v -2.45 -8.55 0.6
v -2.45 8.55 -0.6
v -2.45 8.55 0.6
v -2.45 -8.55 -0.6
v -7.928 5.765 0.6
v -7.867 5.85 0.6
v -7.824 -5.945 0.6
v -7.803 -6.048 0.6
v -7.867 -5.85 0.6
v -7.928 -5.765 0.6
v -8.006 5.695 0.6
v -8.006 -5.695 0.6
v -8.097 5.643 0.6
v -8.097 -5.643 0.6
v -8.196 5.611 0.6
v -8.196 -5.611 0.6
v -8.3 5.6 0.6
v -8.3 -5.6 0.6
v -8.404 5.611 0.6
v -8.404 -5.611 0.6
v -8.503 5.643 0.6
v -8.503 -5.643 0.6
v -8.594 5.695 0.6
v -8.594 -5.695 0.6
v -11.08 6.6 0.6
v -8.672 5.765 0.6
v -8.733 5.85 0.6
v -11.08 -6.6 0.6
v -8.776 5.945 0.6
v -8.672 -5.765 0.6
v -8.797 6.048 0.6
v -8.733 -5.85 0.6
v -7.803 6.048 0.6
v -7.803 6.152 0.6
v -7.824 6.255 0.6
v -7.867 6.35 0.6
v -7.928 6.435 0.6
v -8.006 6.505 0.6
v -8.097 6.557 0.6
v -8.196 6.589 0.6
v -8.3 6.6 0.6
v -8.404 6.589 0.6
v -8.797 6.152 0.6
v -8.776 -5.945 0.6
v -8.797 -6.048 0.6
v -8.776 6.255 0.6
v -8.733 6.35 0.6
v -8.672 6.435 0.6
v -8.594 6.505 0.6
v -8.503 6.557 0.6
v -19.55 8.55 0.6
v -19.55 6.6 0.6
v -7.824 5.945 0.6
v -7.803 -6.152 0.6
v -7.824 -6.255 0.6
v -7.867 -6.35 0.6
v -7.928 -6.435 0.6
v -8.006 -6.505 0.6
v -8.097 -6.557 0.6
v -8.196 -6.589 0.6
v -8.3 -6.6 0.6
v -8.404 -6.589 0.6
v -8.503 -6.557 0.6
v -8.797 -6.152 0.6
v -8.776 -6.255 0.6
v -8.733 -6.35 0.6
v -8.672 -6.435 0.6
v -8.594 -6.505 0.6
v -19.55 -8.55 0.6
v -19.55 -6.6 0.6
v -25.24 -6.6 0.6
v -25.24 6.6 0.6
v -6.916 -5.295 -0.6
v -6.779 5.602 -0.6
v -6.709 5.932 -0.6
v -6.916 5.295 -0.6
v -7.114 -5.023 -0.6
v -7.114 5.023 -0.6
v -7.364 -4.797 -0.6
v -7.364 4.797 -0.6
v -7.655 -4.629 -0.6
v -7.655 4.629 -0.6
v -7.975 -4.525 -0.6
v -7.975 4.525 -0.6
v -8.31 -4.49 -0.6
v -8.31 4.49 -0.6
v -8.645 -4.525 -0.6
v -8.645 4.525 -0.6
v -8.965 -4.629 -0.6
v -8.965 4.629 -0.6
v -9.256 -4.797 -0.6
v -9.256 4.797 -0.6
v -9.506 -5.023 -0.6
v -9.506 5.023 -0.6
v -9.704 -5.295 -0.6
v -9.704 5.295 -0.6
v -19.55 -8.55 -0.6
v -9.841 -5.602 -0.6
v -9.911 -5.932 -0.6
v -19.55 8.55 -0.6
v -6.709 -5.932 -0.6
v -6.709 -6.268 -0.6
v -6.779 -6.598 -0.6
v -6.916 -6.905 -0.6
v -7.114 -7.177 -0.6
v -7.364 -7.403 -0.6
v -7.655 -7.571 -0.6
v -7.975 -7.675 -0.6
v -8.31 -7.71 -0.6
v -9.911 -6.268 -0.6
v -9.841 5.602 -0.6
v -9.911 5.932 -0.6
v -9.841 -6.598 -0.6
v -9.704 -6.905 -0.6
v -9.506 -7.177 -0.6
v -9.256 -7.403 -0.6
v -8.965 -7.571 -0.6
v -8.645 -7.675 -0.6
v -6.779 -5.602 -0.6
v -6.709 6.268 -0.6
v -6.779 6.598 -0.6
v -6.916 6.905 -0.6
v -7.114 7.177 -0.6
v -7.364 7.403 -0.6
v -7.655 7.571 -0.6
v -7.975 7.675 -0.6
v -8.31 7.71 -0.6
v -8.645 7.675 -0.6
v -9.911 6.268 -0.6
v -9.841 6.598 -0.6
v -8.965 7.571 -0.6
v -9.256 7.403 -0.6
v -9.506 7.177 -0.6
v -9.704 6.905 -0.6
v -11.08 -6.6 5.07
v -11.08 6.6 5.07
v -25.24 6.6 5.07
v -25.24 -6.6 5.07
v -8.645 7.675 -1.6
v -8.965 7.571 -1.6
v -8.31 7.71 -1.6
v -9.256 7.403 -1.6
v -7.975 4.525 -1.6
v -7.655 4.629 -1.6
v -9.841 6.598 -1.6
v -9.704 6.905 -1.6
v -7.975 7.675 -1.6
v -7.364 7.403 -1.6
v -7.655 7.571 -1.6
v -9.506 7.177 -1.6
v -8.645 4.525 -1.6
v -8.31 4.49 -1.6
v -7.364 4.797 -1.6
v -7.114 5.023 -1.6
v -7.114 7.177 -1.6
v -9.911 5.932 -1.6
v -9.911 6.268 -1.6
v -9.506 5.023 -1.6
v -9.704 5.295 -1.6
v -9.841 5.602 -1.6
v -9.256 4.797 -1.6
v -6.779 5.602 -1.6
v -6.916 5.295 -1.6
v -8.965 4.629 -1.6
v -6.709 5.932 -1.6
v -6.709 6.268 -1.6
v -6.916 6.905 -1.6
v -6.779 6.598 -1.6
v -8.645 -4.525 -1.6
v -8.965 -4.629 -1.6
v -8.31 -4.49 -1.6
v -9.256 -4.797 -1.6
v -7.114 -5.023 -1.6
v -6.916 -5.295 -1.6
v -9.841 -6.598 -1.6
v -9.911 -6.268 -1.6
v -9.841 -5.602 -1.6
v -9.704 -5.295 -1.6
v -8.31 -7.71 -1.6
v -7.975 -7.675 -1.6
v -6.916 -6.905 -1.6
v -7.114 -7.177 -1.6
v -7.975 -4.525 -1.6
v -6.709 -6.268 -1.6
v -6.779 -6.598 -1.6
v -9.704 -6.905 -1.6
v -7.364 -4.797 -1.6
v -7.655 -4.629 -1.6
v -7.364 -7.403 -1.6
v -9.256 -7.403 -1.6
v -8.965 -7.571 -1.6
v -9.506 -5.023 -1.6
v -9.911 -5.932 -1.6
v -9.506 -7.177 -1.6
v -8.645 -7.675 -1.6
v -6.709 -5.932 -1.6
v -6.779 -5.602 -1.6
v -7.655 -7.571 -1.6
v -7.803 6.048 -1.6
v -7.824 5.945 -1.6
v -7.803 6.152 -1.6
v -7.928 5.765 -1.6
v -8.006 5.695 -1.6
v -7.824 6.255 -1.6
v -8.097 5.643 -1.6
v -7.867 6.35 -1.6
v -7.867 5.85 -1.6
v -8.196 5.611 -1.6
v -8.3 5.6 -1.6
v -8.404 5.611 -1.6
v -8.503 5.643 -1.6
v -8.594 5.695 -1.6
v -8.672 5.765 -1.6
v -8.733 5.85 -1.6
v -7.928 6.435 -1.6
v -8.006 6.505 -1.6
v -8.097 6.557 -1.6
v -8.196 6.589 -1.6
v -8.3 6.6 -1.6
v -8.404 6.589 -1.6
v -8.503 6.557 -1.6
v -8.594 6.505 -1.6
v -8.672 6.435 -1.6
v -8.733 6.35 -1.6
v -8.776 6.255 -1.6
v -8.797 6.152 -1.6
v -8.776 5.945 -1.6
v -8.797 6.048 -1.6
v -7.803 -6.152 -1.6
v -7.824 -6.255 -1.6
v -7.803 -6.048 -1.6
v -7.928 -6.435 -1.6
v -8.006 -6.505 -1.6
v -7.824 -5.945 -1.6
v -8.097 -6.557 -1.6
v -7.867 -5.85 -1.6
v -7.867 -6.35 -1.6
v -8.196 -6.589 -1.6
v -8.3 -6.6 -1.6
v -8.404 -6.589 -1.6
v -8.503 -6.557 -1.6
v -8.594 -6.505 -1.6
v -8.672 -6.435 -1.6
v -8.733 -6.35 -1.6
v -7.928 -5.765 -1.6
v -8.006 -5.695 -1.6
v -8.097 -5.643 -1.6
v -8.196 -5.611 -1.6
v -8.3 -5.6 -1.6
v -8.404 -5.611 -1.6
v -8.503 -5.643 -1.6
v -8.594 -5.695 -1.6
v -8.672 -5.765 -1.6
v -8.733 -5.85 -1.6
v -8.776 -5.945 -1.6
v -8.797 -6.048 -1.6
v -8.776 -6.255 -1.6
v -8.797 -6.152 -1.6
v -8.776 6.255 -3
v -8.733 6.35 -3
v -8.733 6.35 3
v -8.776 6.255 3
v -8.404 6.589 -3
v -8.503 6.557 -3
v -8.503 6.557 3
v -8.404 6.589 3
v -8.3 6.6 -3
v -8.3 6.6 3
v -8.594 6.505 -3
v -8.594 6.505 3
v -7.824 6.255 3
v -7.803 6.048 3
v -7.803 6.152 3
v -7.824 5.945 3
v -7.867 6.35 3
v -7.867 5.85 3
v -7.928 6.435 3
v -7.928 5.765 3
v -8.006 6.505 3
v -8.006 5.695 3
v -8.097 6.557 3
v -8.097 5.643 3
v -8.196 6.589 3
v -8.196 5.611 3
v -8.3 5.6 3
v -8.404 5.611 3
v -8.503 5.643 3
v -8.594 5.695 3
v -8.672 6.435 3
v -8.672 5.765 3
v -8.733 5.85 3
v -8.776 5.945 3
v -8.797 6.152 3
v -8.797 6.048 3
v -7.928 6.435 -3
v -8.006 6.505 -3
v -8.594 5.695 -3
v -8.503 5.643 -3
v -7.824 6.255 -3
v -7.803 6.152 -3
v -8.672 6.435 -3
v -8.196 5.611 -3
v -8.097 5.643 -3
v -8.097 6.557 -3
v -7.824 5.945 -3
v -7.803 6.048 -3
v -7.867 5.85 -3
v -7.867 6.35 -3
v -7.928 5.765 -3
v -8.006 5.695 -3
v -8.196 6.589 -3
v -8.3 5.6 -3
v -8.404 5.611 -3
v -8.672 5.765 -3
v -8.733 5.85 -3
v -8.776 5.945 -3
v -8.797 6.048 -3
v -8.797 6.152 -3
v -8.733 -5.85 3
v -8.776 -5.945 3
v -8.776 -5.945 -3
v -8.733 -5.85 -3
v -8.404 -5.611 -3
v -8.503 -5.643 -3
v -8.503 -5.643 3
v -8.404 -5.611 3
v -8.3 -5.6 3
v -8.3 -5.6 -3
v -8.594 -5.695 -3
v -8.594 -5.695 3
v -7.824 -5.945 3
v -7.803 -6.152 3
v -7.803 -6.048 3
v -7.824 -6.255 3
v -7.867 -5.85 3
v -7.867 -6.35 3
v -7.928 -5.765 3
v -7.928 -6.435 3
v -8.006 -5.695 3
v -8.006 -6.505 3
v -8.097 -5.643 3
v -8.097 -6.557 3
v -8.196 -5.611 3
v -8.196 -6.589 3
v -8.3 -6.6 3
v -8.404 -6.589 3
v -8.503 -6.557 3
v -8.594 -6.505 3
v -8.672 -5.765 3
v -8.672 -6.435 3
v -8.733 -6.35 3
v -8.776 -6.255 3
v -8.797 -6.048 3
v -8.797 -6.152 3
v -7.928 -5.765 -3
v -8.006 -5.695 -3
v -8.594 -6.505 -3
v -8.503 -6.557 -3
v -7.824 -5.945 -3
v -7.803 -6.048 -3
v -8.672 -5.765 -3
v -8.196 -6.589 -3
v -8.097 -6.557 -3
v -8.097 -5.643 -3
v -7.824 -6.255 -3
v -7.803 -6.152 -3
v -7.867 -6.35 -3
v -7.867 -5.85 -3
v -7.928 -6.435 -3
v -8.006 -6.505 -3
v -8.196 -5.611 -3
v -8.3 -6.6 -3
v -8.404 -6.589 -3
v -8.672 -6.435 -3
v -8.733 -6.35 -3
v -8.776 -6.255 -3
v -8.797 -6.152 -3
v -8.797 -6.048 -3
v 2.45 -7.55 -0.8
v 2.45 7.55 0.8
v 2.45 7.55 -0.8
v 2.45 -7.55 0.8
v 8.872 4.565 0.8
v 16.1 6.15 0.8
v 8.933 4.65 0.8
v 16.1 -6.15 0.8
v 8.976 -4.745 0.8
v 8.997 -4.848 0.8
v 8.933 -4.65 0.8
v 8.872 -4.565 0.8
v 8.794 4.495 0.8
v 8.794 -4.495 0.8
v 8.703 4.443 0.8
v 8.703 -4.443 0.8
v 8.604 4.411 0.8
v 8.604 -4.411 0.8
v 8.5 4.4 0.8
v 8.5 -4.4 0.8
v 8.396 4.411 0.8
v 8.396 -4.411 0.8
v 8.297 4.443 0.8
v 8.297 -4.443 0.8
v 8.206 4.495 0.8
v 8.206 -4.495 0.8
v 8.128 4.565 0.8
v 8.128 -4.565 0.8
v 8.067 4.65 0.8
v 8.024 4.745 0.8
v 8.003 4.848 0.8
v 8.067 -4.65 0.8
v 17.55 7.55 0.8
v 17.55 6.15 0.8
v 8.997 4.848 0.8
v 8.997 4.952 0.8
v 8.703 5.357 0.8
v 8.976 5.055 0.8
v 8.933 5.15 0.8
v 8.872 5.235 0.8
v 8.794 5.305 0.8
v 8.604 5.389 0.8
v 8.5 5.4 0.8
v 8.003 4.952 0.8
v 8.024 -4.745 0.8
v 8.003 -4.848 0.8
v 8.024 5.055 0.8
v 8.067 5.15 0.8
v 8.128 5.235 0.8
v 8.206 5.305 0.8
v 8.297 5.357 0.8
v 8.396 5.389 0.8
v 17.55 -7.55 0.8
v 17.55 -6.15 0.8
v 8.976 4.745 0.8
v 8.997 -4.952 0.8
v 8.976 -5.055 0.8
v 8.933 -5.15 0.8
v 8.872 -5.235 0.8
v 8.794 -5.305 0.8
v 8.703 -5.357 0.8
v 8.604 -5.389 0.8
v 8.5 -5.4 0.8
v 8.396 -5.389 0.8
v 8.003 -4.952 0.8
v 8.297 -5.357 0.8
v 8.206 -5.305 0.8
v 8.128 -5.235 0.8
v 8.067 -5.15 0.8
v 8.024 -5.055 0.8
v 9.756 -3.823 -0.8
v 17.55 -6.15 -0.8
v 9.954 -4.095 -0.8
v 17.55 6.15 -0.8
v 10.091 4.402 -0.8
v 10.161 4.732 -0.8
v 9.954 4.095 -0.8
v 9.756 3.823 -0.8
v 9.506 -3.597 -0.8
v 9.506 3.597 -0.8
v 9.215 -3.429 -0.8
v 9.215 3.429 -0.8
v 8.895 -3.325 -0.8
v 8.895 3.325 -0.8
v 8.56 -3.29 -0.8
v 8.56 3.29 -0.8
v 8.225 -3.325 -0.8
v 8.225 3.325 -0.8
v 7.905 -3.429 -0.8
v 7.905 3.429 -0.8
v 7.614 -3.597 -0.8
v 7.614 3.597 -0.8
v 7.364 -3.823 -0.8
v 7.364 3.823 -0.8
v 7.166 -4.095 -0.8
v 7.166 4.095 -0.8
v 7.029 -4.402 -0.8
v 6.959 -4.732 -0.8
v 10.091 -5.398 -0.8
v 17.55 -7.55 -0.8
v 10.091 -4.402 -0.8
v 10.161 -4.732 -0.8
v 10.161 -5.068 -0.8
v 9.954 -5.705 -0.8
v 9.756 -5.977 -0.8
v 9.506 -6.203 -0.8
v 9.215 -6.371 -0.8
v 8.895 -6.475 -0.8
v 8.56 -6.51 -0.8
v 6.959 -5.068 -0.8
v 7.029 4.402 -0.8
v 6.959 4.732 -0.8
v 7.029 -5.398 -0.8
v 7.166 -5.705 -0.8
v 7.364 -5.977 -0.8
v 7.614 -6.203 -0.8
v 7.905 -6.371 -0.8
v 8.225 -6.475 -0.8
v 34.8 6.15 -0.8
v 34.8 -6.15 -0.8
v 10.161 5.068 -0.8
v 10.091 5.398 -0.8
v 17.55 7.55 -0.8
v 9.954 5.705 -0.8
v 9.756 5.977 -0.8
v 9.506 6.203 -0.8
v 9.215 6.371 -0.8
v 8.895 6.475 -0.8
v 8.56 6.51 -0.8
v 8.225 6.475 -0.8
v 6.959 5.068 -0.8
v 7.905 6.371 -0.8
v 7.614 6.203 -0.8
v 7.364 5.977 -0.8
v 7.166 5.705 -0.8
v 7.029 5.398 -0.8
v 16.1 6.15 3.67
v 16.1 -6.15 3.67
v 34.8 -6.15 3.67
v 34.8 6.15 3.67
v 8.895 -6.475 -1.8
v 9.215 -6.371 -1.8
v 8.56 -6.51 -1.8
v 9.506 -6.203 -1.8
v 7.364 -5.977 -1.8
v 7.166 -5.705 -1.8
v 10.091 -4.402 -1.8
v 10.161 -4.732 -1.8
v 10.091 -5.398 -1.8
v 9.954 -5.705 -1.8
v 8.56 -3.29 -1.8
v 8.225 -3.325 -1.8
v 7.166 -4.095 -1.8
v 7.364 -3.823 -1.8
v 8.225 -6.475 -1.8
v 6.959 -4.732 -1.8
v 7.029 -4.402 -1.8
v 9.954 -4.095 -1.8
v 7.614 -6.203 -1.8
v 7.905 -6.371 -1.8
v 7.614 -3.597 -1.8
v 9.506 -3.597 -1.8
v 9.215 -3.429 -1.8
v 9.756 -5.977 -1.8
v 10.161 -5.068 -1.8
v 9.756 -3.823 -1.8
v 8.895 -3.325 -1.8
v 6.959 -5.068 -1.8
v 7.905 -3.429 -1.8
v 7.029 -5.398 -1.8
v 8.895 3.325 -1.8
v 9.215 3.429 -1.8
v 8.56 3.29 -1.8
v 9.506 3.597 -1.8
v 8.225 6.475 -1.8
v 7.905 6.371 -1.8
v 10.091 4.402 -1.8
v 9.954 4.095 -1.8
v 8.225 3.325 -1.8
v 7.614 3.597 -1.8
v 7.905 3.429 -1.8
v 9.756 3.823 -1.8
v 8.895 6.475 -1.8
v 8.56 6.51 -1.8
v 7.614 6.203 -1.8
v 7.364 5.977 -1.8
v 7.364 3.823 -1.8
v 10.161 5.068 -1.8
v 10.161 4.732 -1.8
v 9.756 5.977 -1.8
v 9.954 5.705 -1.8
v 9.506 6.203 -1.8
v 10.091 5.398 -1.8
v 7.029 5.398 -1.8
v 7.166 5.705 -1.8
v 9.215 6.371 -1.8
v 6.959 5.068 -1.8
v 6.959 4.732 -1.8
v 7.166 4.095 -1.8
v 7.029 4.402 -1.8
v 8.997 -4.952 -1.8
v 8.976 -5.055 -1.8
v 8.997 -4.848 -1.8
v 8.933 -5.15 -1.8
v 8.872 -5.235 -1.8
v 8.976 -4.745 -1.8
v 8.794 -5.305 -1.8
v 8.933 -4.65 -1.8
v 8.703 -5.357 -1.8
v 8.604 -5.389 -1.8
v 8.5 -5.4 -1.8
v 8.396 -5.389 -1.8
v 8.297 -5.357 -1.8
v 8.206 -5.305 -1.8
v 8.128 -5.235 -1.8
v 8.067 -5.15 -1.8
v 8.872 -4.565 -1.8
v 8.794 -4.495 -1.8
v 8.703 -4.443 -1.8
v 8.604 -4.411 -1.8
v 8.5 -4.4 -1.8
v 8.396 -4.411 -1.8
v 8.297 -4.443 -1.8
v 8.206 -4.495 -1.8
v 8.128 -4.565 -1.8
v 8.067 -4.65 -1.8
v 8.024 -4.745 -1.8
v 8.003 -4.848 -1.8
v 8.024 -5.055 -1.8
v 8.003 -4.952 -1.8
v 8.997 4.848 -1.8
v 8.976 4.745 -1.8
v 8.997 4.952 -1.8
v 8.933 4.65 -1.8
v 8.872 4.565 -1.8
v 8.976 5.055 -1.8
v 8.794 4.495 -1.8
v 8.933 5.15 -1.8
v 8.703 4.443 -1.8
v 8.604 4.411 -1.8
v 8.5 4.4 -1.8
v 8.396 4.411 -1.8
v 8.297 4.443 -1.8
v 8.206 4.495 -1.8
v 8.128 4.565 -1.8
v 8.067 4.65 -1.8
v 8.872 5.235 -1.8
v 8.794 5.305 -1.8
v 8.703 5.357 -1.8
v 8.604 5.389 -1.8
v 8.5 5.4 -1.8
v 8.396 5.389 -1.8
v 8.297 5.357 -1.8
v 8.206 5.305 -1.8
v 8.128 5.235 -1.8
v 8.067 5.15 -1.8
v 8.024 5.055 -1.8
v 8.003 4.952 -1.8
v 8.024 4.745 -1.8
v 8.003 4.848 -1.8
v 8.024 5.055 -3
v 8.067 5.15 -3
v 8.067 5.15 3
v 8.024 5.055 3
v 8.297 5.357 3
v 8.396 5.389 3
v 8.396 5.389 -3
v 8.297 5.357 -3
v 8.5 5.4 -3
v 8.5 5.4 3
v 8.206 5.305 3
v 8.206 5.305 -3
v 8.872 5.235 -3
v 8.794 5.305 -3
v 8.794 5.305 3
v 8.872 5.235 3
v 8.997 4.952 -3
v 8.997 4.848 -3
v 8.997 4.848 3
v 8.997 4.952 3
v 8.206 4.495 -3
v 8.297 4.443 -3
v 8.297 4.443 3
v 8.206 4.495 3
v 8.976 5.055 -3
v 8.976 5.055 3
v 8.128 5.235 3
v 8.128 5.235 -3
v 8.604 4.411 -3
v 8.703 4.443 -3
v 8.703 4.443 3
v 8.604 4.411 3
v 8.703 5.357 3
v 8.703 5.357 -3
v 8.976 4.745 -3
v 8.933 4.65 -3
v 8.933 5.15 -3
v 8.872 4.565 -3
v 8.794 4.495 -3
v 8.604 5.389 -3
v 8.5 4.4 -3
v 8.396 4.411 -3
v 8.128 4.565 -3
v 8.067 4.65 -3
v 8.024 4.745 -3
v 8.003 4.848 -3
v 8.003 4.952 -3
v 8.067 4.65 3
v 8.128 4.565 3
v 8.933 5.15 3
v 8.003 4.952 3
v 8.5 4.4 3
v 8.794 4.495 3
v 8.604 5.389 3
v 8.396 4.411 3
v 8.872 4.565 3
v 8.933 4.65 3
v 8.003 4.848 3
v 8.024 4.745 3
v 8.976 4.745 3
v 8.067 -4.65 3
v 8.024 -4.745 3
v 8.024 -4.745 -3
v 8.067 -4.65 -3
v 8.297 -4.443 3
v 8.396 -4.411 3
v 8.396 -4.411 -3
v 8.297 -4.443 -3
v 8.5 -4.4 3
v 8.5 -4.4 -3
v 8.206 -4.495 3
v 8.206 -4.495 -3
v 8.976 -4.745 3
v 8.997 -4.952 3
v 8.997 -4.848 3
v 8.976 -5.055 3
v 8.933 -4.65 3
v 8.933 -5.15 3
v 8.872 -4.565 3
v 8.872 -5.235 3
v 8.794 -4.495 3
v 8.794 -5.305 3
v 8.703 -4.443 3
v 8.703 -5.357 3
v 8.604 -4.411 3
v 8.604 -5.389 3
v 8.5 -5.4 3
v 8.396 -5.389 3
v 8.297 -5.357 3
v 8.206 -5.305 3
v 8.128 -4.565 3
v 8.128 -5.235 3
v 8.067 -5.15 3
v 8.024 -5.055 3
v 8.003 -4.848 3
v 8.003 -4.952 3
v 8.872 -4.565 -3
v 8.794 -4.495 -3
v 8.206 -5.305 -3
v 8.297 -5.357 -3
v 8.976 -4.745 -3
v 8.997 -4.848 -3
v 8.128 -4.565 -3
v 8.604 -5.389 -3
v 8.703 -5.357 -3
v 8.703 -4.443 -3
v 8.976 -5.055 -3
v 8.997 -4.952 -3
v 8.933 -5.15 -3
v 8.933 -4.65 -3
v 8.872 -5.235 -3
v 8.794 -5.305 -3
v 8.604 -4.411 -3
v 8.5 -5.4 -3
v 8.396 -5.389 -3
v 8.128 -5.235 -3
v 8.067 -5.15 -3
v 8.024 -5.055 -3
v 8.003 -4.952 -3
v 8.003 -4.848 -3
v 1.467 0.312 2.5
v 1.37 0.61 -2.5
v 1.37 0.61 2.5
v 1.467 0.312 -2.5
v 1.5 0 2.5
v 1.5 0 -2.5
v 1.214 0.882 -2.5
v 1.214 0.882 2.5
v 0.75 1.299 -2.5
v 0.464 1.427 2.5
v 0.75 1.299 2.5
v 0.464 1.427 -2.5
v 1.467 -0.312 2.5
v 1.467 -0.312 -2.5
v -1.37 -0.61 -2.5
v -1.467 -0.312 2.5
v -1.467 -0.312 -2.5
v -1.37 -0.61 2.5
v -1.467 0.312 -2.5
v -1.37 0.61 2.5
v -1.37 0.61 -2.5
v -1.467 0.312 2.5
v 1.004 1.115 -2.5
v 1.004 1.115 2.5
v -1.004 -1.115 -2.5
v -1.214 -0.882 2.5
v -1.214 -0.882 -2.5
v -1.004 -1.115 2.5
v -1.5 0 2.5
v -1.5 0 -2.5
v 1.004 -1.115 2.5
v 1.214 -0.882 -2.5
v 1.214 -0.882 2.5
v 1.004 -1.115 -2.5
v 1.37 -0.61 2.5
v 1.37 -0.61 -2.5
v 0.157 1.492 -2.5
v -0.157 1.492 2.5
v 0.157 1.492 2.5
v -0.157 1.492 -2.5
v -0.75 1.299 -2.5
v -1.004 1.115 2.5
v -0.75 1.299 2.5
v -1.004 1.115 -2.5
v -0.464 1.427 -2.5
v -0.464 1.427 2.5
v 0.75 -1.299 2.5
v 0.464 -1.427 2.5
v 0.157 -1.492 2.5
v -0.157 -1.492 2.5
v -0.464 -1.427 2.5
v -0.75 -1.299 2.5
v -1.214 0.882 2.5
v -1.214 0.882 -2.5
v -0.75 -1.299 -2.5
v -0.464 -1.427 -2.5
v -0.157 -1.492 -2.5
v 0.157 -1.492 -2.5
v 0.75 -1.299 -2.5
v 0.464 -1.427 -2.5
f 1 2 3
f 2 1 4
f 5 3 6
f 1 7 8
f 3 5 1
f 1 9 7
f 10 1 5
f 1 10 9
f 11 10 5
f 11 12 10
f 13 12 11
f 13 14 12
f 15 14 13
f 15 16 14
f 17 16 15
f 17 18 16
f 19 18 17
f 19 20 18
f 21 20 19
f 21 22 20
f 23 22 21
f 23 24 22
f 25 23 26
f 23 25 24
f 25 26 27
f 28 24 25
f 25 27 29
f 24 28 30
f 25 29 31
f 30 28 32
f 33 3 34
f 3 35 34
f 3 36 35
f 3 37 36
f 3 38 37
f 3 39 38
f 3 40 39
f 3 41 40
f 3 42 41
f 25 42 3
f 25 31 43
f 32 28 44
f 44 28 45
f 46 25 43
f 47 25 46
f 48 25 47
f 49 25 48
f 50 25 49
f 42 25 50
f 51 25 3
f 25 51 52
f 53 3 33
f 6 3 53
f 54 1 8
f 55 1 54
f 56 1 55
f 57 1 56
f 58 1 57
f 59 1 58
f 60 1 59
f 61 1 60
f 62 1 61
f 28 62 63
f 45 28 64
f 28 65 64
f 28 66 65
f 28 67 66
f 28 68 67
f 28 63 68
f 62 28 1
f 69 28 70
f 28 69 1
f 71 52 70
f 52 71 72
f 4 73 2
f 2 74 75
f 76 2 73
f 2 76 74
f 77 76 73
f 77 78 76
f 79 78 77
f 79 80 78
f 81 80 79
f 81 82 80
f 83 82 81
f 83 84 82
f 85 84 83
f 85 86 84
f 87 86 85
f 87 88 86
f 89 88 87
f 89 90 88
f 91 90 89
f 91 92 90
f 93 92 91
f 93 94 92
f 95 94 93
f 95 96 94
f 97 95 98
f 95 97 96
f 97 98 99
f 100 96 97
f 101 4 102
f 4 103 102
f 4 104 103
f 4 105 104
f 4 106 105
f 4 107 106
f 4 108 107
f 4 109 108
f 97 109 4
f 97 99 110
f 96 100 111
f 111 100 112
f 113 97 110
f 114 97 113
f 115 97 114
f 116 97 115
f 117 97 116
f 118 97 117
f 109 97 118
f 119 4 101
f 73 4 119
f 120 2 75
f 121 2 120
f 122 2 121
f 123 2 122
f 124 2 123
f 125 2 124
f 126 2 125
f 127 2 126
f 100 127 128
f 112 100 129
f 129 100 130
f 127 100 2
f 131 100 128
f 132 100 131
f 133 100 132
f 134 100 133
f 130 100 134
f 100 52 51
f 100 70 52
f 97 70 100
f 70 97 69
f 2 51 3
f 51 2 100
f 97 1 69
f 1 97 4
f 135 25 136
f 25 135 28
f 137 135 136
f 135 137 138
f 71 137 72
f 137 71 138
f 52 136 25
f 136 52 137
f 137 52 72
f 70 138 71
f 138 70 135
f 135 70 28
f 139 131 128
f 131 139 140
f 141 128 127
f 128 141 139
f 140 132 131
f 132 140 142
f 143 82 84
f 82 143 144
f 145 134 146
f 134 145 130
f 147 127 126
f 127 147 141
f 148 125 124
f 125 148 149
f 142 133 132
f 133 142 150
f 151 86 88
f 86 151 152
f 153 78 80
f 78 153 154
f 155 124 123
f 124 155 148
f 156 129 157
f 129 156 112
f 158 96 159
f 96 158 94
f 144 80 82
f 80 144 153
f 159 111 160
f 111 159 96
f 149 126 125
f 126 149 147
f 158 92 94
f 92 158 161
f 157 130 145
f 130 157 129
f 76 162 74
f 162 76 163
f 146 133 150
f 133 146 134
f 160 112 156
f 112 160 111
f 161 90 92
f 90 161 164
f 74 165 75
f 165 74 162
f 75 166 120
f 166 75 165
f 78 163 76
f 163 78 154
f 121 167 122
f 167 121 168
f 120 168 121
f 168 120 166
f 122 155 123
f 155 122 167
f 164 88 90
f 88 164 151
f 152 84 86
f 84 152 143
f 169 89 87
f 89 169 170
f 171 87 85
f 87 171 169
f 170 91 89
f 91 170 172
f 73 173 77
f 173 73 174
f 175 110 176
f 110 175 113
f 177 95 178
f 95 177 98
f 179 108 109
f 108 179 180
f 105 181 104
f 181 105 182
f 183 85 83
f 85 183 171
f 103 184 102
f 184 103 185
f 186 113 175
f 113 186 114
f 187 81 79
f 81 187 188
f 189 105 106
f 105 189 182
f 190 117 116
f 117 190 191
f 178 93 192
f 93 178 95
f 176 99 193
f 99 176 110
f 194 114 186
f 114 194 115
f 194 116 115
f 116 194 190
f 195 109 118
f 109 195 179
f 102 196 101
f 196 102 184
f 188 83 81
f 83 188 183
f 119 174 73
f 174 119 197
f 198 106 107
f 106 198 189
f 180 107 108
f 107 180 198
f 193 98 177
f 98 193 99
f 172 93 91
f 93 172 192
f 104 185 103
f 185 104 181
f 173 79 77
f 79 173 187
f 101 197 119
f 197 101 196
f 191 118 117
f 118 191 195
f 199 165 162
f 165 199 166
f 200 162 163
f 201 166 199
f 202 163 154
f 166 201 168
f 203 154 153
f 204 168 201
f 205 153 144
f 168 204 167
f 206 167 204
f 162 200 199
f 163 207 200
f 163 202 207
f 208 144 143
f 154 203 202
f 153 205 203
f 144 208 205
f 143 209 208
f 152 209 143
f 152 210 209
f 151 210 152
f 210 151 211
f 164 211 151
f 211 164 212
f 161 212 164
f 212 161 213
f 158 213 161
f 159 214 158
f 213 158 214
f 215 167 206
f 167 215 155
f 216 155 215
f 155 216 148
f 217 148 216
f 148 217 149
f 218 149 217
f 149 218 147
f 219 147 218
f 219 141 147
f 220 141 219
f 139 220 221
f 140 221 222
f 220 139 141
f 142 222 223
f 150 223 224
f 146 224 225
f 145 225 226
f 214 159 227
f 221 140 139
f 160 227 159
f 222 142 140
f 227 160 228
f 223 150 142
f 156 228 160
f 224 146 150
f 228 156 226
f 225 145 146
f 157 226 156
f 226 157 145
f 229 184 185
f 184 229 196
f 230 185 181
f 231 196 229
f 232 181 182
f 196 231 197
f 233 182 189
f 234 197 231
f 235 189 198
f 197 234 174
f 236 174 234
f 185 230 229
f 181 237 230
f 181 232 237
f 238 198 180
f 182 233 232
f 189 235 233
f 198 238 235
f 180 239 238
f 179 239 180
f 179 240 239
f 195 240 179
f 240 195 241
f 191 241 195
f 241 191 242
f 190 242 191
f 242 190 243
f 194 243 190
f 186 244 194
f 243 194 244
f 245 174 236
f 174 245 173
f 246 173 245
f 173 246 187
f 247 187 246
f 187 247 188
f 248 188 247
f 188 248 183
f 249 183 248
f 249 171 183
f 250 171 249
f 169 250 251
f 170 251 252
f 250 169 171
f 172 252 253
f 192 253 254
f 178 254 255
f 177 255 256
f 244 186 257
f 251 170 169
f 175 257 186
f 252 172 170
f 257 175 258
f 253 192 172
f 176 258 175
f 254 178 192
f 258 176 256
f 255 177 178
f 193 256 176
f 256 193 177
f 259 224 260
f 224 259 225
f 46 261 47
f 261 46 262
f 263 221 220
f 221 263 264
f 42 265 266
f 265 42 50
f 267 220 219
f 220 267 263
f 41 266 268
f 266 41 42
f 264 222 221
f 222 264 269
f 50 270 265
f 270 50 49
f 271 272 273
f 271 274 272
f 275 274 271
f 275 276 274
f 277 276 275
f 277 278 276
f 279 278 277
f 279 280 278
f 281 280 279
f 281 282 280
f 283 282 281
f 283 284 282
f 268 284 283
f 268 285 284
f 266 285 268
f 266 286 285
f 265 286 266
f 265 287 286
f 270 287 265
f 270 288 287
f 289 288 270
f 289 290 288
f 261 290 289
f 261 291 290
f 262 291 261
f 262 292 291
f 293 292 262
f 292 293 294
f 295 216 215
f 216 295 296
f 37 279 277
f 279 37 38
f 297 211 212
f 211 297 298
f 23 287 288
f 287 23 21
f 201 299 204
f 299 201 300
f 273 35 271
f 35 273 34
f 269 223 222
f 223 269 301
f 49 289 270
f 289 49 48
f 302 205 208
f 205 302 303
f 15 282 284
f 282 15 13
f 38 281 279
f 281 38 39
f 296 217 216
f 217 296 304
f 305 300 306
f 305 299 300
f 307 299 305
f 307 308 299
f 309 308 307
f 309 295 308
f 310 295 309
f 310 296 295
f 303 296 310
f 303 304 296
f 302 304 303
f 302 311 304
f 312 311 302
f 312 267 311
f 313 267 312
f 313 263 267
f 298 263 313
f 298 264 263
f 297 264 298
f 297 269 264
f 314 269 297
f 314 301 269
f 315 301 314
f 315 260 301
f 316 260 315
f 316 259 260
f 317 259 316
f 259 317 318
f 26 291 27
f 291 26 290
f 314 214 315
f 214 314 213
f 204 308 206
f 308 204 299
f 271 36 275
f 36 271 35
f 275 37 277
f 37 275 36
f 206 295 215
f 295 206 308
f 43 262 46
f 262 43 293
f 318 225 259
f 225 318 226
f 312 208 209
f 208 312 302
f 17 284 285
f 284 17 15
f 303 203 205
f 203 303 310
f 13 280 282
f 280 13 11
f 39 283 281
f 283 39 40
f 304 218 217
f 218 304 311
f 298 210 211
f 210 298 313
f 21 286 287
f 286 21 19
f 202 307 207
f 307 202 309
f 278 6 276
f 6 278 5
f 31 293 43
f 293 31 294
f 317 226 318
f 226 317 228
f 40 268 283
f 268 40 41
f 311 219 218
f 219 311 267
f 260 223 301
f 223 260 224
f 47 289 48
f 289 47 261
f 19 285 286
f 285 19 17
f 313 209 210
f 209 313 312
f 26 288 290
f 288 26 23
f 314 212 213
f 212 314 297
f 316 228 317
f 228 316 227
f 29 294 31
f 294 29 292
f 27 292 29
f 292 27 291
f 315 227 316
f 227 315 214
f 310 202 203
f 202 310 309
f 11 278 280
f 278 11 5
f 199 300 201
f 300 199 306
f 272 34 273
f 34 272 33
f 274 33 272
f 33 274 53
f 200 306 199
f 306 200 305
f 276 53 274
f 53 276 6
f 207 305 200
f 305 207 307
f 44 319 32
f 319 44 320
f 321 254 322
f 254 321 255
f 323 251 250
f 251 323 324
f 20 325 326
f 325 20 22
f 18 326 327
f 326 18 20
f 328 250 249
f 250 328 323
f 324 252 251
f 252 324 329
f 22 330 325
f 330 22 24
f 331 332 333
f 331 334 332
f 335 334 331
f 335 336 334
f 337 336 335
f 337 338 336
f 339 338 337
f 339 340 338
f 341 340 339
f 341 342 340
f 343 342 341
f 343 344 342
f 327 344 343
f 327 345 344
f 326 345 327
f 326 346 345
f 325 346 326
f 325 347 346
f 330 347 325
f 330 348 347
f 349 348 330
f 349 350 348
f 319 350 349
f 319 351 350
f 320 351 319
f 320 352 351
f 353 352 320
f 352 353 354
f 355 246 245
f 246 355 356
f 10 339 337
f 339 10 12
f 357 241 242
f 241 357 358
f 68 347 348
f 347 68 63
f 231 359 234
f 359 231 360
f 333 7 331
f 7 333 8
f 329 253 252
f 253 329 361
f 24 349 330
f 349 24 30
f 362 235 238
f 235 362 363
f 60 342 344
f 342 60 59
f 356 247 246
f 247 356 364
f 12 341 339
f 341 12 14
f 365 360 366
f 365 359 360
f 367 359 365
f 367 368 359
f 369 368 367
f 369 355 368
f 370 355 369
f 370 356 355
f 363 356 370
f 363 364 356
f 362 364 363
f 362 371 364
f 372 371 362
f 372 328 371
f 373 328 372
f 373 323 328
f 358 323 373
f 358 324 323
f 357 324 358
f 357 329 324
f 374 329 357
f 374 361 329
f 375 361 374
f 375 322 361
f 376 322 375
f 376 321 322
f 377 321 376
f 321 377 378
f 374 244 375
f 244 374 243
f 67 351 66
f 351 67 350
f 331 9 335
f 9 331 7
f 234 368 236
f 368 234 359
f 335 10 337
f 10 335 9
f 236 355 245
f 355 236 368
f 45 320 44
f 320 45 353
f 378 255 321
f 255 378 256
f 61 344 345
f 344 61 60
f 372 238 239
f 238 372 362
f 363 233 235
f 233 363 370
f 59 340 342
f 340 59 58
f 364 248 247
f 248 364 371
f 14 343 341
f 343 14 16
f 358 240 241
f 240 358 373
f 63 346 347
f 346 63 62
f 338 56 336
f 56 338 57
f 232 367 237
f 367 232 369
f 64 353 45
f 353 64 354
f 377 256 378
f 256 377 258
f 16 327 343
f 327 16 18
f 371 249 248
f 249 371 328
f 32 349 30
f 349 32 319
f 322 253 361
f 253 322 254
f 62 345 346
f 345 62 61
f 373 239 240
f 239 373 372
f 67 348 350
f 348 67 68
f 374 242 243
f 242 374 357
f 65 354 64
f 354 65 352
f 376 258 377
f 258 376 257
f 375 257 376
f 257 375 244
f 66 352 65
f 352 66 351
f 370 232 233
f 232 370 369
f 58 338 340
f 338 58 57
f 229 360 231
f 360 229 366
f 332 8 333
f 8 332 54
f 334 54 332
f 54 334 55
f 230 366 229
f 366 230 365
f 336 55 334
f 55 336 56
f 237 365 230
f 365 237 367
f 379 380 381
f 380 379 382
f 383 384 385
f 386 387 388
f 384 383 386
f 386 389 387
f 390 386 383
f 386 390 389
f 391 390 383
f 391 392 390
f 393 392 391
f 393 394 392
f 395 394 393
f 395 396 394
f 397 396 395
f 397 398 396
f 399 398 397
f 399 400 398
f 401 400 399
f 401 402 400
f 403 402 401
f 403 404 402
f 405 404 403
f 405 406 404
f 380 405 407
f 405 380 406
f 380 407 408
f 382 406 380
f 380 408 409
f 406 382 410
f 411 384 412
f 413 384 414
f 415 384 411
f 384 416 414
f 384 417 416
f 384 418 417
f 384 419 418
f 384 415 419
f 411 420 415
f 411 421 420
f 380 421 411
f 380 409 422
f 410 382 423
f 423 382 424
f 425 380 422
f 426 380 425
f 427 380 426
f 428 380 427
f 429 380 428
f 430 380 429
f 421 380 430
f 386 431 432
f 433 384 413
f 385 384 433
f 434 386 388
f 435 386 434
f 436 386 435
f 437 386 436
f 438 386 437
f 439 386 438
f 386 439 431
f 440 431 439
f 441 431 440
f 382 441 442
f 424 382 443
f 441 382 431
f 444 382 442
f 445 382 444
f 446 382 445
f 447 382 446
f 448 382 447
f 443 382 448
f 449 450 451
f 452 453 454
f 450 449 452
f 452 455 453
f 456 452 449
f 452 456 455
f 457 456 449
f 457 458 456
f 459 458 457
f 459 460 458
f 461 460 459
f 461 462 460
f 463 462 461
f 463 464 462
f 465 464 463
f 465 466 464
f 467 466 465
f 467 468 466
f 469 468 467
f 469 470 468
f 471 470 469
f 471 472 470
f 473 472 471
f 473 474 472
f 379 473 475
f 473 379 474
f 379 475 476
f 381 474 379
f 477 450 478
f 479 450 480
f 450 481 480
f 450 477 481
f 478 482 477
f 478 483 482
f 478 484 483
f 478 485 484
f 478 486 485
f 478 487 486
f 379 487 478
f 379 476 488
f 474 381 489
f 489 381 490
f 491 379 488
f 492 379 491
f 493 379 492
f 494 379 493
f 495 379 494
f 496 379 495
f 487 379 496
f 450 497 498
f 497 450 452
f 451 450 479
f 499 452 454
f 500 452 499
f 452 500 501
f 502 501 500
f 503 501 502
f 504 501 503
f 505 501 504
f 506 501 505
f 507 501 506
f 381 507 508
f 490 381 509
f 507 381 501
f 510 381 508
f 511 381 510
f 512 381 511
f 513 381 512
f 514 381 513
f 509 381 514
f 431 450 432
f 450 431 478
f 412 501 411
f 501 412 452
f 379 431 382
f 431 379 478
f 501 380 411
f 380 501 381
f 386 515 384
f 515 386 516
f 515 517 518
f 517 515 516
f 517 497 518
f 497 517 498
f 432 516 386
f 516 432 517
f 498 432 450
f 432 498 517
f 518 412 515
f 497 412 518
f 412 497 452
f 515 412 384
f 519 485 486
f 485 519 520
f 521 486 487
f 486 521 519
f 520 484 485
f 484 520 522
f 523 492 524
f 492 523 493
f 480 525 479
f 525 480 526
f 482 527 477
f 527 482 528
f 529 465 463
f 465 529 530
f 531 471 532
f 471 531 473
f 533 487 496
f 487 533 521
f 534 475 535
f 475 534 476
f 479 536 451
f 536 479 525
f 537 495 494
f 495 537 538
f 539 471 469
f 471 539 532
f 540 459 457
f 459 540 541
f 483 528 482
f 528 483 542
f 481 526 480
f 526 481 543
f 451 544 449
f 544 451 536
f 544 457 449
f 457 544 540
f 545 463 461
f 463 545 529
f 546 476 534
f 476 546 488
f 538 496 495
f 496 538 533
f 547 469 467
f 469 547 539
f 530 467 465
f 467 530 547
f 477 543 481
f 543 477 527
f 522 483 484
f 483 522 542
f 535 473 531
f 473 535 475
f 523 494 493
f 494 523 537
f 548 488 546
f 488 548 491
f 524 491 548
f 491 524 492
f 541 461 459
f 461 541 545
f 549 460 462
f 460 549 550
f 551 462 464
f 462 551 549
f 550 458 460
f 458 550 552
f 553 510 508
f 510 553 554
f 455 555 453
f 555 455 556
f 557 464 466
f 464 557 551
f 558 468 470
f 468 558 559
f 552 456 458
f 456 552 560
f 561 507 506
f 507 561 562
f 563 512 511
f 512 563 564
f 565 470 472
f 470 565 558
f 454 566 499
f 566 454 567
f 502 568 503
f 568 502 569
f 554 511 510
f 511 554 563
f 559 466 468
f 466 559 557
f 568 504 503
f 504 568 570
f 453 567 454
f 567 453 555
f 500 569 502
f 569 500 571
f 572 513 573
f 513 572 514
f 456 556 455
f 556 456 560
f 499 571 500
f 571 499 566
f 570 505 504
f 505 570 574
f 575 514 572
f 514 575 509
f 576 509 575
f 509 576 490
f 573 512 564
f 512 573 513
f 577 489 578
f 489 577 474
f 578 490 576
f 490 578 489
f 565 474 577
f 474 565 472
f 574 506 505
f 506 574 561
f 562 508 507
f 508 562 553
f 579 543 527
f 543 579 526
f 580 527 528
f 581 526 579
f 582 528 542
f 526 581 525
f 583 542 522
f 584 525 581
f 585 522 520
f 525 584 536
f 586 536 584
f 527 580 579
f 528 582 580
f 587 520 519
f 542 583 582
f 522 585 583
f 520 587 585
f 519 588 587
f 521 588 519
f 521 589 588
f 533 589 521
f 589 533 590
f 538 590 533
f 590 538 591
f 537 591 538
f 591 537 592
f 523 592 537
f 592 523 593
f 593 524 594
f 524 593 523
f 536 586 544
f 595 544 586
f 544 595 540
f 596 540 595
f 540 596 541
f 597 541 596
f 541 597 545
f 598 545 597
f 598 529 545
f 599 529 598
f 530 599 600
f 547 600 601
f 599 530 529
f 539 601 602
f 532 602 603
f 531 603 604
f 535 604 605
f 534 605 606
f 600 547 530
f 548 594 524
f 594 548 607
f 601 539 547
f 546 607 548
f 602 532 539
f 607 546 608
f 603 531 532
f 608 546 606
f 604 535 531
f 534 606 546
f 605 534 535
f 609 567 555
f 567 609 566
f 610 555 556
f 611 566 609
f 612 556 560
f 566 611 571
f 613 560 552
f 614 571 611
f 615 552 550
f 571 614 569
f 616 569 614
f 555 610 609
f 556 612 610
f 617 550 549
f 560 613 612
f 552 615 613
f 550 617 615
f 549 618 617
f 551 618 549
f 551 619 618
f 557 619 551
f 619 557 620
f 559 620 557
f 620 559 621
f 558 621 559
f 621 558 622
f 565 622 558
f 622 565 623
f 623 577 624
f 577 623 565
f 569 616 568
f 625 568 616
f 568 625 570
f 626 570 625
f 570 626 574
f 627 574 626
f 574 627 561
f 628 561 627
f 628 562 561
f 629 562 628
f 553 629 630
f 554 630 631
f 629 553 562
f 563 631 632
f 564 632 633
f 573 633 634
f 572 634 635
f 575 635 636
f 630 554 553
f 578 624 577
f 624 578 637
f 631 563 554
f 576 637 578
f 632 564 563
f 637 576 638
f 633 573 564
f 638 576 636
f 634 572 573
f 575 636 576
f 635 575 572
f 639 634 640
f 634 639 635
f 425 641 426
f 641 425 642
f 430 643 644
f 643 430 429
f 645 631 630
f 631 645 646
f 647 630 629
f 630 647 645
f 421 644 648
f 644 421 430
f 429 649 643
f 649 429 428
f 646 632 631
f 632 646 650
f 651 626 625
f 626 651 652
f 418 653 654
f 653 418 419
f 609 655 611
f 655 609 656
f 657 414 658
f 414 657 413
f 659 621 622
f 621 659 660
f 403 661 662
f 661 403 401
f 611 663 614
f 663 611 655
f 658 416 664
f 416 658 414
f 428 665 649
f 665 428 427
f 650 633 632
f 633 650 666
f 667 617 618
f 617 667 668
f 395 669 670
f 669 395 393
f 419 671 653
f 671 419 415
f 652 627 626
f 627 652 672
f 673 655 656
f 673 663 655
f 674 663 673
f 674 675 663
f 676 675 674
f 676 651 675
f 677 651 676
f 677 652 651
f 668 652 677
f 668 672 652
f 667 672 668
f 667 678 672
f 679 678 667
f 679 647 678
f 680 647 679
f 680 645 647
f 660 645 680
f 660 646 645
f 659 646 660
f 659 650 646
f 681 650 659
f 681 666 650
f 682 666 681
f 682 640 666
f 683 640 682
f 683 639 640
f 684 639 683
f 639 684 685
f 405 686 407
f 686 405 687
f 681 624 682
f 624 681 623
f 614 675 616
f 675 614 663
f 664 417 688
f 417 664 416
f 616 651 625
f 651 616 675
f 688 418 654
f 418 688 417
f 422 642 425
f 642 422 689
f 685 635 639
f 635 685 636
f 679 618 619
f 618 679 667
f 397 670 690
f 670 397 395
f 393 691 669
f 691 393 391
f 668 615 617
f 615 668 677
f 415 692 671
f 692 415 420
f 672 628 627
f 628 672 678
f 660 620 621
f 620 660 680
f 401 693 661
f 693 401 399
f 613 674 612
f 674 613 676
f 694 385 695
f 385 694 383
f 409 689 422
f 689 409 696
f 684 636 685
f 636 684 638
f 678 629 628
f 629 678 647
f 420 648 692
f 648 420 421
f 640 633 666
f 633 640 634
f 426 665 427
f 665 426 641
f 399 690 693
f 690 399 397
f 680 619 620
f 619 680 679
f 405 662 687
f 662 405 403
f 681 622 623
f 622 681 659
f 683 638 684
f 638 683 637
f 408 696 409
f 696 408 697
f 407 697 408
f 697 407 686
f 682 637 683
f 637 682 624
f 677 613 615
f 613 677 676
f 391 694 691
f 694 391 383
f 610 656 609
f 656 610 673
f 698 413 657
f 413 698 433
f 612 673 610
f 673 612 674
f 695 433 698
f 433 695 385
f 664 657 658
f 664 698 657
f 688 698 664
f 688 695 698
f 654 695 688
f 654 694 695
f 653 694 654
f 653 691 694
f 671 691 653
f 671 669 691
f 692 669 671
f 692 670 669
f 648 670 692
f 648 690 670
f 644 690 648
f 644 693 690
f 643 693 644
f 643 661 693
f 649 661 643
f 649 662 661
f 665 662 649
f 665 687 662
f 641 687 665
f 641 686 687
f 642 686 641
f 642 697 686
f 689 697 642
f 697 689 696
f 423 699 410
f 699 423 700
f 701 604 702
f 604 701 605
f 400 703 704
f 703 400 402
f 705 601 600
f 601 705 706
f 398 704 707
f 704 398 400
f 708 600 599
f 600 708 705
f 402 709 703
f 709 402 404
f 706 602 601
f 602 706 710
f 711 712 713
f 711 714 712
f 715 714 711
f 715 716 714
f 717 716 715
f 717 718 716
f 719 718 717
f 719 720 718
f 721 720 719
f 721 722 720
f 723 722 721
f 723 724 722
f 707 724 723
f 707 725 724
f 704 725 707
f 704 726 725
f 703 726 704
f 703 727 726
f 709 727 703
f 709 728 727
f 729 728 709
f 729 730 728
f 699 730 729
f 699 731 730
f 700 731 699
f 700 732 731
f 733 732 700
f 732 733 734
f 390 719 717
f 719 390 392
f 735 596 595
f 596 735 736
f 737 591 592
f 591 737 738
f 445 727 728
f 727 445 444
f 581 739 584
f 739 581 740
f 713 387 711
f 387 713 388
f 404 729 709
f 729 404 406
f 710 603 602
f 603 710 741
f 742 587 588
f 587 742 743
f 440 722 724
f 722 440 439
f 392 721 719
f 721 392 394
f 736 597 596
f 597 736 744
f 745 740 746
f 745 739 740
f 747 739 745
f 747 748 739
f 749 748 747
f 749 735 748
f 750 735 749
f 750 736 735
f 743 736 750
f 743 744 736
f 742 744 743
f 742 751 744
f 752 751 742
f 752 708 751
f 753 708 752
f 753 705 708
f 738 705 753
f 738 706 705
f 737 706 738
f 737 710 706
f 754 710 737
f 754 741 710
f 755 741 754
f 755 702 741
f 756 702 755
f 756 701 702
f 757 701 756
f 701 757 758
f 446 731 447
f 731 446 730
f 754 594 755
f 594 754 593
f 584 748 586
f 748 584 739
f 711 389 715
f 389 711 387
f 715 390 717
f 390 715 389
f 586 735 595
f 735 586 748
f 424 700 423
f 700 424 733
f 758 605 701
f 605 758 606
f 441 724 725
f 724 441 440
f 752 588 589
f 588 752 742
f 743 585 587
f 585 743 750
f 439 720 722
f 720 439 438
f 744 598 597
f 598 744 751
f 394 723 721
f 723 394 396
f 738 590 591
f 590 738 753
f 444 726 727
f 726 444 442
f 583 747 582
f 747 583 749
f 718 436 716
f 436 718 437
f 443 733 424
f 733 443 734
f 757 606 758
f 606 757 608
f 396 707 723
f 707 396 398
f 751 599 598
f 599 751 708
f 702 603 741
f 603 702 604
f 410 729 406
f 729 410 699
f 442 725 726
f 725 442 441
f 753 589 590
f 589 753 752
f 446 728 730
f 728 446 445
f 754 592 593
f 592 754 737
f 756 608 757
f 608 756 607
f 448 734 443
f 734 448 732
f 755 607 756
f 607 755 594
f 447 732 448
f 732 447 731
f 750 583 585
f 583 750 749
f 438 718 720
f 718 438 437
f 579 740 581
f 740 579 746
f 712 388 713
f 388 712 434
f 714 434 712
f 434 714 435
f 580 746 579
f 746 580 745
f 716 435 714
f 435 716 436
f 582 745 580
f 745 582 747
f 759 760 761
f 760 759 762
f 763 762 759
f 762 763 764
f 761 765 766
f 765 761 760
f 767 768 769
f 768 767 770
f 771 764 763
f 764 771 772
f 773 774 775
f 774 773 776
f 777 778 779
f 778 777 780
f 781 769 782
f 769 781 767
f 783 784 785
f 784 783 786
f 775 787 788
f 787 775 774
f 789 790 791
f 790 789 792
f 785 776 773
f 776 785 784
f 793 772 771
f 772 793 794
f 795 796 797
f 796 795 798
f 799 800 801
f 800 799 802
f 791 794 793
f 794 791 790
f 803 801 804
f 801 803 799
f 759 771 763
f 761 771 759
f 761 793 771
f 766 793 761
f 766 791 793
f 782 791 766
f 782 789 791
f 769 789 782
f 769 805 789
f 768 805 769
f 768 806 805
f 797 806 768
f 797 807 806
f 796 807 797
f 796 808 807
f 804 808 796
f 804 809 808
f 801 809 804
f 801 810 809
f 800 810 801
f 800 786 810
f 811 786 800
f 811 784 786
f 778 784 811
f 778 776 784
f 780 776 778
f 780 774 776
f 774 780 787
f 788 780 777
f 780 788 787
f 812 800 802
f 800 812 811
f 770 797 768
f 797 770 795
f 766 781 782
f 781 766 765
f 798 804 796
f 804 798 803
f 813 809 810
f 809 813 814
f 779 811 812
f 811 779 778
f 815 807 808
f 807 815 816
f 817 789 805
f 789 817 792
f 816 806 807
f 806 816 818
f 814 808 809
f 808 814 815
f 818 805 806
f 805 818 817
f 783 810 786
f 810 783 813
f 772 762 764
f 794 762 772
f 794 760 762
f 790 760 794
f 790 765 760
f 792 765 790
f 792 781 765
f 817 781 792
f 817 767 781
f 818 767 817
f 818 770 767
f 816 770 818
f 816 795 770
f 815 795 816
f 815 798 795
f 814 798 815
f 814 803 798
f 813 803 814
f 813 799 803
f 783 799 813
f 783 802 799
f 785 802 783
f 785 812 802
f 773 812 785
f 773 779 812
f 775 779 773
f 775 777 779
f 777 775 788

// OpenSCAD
// file: usb_BreakoutShared.scad
//
// USB A Male
//
AM_boardLength=15.1;
AM_boardWidth=15.1;
AM_boardHeigth=1.6;

AM_usbLength=18.7;
AM_usbWidth=12.3;
AM_usbHeigth=4.47;
AM_usbLengthOffset=3.25;
AM_usbHeigthOffset=AM_boardHeigth;

AM_boardBoltHoleDiamiter=3.22;
AM_boardBoltHoleSperation=9.8;
AM_boardBoltHoleFromEdge=1.3;
AM_boardBoltHoleFromBack=4.5;
//
// USB A Female
//
AF_boardLength=17.1;
AF_boardWidth=17.1;
AF_boardHeigth=1.2;

AF_usbLength=14.16;
AF_usbWidth=13.2;
AF_usbHeigth=4.47;
AF_usbLengthOffset=7.0;
AF_usbHeigthOffset=-AF_boardHeigth;

AF_boardBoltHoleDiamiter=3.22;
AF_boardBoltHoleSperation=12.2;
AF_boardBoltHoleFromEdge=1.3;
AF_boardBoltHoleFromBack=4.25;
//////////////////////////////////////
module boardMountingHoles(iHoleSperation,iHoleDiamiter,iZ){
  for(a=[1,-1]){
    translate([0,a*(iHoleSperation/2),0])
      color("silver")
      boardMountingHole(iHoleDiamiter,iZ);
  }
}
//////////////////////////////////////
module boardMountingHole(iHoleDiamiter,iZ){
  rotate([0,0,90])
    cylinder(d=iHoleDiamiter,h=iZ+1,center=true);
}
// file: usb_AF_Breakout_X002XESLL7.scad
$fn=30;

include<usb_BreakoutShared.scad>;



AF_boardModel();

//////////////////////////////////////
module AF_boardModel(){
  difference(){
    union(){
// Circit Board
      color("LimeGreen")
      cube([AF_boardLength, AF_boardWidth, AF_boardHeigth],center=true);
//  USB Connector
      translate([-AF_usbLength+AF_usbLengthOffset,0,(AF_usbHeigth/2)-(AF_usbHeigthOffset/2)])
        color("silver")
        cube([AF_usbLength, AF_usbWidth, AF_usbHeigth],center=true);
    }
// Mounting Holes
    AF_boardMounts();
  }
}
//////////////////////////////////////
module AF_boardMounts(){
  translate([(AF_boardLength/2)-((AF_boardBoltHoleDiamiter/2)+AF_boardBoltHoleFromBack),0,0])
    boardMountingHoles(AF_boardBoltHoleSperation,AF_boardBoltHoleDiamiter,AF_boardHeigth); 
}
//////////////////////////////////////
//////////////////////////////////////
// file: usb_AM_Breakout_X00221NUOT.scad
$fn=30;

include<usb_BreakoutShared.scad>;

//////////////////////////////////////
module AM_boardModel(){
  difference(){
    union(){
// Circit Board
      color("LimeGreen")
      cube([AM_boardLength, AM_boardWidth, AM_boardHeigth],center=true);
//  USB Connector
      translate([-AM_usbLength+AM_usbLengthOffset,0,(AM_usbHeigth/2)-(AM_usbHeigthOffset/2)])
        color("silver")
        cube([AM_usbLength, AM_usbWidth, AM_usbHeigth],center=true);
    }
// Mounting Holes
    AM_boardMounts();
  }
}
//////////////////////////////////////
module AM_boardMounts(){
  translate([(AM_boardLength/2)-((AM_boardBoltHoleDiamiter/2)+AM_boardBoltHoleFromBack),0,0])
    boardMountingHoles(AM_boardBoltHoleSperation,AM_boardBoltHoleDiamiter,AM_boardHeigth);  
}
//////////////////////////////////////
//////////////////////////////////////
// main file
$fn=30;

use<usb_AM_Breakout_X00221NUOT.scad>;
use<usb_AF_Breakout_X002XESLL7.scad>;

include<usb_BreakoutShared.scad>;


translate([-11,0,0]){
  AF_boardModel();
  translate([0,0,-.5])
    AF_boardMounts();
translate([2.7,0,0])
      boardMountingHoles(AF_boardBoltHoleSperation,1,5);
}


translate([10,0,0]){
  rotate([0,0,180]){
    AM_boardModel();
    translate([0,0,-.5]){
      AM_boardMounts();

  }
}
translate([-1.5,0,0])
      boardMountingHoles(AM_boardBoltHoleSperation,1,5);

}


cylinder(d=3,h=5,center=true);
